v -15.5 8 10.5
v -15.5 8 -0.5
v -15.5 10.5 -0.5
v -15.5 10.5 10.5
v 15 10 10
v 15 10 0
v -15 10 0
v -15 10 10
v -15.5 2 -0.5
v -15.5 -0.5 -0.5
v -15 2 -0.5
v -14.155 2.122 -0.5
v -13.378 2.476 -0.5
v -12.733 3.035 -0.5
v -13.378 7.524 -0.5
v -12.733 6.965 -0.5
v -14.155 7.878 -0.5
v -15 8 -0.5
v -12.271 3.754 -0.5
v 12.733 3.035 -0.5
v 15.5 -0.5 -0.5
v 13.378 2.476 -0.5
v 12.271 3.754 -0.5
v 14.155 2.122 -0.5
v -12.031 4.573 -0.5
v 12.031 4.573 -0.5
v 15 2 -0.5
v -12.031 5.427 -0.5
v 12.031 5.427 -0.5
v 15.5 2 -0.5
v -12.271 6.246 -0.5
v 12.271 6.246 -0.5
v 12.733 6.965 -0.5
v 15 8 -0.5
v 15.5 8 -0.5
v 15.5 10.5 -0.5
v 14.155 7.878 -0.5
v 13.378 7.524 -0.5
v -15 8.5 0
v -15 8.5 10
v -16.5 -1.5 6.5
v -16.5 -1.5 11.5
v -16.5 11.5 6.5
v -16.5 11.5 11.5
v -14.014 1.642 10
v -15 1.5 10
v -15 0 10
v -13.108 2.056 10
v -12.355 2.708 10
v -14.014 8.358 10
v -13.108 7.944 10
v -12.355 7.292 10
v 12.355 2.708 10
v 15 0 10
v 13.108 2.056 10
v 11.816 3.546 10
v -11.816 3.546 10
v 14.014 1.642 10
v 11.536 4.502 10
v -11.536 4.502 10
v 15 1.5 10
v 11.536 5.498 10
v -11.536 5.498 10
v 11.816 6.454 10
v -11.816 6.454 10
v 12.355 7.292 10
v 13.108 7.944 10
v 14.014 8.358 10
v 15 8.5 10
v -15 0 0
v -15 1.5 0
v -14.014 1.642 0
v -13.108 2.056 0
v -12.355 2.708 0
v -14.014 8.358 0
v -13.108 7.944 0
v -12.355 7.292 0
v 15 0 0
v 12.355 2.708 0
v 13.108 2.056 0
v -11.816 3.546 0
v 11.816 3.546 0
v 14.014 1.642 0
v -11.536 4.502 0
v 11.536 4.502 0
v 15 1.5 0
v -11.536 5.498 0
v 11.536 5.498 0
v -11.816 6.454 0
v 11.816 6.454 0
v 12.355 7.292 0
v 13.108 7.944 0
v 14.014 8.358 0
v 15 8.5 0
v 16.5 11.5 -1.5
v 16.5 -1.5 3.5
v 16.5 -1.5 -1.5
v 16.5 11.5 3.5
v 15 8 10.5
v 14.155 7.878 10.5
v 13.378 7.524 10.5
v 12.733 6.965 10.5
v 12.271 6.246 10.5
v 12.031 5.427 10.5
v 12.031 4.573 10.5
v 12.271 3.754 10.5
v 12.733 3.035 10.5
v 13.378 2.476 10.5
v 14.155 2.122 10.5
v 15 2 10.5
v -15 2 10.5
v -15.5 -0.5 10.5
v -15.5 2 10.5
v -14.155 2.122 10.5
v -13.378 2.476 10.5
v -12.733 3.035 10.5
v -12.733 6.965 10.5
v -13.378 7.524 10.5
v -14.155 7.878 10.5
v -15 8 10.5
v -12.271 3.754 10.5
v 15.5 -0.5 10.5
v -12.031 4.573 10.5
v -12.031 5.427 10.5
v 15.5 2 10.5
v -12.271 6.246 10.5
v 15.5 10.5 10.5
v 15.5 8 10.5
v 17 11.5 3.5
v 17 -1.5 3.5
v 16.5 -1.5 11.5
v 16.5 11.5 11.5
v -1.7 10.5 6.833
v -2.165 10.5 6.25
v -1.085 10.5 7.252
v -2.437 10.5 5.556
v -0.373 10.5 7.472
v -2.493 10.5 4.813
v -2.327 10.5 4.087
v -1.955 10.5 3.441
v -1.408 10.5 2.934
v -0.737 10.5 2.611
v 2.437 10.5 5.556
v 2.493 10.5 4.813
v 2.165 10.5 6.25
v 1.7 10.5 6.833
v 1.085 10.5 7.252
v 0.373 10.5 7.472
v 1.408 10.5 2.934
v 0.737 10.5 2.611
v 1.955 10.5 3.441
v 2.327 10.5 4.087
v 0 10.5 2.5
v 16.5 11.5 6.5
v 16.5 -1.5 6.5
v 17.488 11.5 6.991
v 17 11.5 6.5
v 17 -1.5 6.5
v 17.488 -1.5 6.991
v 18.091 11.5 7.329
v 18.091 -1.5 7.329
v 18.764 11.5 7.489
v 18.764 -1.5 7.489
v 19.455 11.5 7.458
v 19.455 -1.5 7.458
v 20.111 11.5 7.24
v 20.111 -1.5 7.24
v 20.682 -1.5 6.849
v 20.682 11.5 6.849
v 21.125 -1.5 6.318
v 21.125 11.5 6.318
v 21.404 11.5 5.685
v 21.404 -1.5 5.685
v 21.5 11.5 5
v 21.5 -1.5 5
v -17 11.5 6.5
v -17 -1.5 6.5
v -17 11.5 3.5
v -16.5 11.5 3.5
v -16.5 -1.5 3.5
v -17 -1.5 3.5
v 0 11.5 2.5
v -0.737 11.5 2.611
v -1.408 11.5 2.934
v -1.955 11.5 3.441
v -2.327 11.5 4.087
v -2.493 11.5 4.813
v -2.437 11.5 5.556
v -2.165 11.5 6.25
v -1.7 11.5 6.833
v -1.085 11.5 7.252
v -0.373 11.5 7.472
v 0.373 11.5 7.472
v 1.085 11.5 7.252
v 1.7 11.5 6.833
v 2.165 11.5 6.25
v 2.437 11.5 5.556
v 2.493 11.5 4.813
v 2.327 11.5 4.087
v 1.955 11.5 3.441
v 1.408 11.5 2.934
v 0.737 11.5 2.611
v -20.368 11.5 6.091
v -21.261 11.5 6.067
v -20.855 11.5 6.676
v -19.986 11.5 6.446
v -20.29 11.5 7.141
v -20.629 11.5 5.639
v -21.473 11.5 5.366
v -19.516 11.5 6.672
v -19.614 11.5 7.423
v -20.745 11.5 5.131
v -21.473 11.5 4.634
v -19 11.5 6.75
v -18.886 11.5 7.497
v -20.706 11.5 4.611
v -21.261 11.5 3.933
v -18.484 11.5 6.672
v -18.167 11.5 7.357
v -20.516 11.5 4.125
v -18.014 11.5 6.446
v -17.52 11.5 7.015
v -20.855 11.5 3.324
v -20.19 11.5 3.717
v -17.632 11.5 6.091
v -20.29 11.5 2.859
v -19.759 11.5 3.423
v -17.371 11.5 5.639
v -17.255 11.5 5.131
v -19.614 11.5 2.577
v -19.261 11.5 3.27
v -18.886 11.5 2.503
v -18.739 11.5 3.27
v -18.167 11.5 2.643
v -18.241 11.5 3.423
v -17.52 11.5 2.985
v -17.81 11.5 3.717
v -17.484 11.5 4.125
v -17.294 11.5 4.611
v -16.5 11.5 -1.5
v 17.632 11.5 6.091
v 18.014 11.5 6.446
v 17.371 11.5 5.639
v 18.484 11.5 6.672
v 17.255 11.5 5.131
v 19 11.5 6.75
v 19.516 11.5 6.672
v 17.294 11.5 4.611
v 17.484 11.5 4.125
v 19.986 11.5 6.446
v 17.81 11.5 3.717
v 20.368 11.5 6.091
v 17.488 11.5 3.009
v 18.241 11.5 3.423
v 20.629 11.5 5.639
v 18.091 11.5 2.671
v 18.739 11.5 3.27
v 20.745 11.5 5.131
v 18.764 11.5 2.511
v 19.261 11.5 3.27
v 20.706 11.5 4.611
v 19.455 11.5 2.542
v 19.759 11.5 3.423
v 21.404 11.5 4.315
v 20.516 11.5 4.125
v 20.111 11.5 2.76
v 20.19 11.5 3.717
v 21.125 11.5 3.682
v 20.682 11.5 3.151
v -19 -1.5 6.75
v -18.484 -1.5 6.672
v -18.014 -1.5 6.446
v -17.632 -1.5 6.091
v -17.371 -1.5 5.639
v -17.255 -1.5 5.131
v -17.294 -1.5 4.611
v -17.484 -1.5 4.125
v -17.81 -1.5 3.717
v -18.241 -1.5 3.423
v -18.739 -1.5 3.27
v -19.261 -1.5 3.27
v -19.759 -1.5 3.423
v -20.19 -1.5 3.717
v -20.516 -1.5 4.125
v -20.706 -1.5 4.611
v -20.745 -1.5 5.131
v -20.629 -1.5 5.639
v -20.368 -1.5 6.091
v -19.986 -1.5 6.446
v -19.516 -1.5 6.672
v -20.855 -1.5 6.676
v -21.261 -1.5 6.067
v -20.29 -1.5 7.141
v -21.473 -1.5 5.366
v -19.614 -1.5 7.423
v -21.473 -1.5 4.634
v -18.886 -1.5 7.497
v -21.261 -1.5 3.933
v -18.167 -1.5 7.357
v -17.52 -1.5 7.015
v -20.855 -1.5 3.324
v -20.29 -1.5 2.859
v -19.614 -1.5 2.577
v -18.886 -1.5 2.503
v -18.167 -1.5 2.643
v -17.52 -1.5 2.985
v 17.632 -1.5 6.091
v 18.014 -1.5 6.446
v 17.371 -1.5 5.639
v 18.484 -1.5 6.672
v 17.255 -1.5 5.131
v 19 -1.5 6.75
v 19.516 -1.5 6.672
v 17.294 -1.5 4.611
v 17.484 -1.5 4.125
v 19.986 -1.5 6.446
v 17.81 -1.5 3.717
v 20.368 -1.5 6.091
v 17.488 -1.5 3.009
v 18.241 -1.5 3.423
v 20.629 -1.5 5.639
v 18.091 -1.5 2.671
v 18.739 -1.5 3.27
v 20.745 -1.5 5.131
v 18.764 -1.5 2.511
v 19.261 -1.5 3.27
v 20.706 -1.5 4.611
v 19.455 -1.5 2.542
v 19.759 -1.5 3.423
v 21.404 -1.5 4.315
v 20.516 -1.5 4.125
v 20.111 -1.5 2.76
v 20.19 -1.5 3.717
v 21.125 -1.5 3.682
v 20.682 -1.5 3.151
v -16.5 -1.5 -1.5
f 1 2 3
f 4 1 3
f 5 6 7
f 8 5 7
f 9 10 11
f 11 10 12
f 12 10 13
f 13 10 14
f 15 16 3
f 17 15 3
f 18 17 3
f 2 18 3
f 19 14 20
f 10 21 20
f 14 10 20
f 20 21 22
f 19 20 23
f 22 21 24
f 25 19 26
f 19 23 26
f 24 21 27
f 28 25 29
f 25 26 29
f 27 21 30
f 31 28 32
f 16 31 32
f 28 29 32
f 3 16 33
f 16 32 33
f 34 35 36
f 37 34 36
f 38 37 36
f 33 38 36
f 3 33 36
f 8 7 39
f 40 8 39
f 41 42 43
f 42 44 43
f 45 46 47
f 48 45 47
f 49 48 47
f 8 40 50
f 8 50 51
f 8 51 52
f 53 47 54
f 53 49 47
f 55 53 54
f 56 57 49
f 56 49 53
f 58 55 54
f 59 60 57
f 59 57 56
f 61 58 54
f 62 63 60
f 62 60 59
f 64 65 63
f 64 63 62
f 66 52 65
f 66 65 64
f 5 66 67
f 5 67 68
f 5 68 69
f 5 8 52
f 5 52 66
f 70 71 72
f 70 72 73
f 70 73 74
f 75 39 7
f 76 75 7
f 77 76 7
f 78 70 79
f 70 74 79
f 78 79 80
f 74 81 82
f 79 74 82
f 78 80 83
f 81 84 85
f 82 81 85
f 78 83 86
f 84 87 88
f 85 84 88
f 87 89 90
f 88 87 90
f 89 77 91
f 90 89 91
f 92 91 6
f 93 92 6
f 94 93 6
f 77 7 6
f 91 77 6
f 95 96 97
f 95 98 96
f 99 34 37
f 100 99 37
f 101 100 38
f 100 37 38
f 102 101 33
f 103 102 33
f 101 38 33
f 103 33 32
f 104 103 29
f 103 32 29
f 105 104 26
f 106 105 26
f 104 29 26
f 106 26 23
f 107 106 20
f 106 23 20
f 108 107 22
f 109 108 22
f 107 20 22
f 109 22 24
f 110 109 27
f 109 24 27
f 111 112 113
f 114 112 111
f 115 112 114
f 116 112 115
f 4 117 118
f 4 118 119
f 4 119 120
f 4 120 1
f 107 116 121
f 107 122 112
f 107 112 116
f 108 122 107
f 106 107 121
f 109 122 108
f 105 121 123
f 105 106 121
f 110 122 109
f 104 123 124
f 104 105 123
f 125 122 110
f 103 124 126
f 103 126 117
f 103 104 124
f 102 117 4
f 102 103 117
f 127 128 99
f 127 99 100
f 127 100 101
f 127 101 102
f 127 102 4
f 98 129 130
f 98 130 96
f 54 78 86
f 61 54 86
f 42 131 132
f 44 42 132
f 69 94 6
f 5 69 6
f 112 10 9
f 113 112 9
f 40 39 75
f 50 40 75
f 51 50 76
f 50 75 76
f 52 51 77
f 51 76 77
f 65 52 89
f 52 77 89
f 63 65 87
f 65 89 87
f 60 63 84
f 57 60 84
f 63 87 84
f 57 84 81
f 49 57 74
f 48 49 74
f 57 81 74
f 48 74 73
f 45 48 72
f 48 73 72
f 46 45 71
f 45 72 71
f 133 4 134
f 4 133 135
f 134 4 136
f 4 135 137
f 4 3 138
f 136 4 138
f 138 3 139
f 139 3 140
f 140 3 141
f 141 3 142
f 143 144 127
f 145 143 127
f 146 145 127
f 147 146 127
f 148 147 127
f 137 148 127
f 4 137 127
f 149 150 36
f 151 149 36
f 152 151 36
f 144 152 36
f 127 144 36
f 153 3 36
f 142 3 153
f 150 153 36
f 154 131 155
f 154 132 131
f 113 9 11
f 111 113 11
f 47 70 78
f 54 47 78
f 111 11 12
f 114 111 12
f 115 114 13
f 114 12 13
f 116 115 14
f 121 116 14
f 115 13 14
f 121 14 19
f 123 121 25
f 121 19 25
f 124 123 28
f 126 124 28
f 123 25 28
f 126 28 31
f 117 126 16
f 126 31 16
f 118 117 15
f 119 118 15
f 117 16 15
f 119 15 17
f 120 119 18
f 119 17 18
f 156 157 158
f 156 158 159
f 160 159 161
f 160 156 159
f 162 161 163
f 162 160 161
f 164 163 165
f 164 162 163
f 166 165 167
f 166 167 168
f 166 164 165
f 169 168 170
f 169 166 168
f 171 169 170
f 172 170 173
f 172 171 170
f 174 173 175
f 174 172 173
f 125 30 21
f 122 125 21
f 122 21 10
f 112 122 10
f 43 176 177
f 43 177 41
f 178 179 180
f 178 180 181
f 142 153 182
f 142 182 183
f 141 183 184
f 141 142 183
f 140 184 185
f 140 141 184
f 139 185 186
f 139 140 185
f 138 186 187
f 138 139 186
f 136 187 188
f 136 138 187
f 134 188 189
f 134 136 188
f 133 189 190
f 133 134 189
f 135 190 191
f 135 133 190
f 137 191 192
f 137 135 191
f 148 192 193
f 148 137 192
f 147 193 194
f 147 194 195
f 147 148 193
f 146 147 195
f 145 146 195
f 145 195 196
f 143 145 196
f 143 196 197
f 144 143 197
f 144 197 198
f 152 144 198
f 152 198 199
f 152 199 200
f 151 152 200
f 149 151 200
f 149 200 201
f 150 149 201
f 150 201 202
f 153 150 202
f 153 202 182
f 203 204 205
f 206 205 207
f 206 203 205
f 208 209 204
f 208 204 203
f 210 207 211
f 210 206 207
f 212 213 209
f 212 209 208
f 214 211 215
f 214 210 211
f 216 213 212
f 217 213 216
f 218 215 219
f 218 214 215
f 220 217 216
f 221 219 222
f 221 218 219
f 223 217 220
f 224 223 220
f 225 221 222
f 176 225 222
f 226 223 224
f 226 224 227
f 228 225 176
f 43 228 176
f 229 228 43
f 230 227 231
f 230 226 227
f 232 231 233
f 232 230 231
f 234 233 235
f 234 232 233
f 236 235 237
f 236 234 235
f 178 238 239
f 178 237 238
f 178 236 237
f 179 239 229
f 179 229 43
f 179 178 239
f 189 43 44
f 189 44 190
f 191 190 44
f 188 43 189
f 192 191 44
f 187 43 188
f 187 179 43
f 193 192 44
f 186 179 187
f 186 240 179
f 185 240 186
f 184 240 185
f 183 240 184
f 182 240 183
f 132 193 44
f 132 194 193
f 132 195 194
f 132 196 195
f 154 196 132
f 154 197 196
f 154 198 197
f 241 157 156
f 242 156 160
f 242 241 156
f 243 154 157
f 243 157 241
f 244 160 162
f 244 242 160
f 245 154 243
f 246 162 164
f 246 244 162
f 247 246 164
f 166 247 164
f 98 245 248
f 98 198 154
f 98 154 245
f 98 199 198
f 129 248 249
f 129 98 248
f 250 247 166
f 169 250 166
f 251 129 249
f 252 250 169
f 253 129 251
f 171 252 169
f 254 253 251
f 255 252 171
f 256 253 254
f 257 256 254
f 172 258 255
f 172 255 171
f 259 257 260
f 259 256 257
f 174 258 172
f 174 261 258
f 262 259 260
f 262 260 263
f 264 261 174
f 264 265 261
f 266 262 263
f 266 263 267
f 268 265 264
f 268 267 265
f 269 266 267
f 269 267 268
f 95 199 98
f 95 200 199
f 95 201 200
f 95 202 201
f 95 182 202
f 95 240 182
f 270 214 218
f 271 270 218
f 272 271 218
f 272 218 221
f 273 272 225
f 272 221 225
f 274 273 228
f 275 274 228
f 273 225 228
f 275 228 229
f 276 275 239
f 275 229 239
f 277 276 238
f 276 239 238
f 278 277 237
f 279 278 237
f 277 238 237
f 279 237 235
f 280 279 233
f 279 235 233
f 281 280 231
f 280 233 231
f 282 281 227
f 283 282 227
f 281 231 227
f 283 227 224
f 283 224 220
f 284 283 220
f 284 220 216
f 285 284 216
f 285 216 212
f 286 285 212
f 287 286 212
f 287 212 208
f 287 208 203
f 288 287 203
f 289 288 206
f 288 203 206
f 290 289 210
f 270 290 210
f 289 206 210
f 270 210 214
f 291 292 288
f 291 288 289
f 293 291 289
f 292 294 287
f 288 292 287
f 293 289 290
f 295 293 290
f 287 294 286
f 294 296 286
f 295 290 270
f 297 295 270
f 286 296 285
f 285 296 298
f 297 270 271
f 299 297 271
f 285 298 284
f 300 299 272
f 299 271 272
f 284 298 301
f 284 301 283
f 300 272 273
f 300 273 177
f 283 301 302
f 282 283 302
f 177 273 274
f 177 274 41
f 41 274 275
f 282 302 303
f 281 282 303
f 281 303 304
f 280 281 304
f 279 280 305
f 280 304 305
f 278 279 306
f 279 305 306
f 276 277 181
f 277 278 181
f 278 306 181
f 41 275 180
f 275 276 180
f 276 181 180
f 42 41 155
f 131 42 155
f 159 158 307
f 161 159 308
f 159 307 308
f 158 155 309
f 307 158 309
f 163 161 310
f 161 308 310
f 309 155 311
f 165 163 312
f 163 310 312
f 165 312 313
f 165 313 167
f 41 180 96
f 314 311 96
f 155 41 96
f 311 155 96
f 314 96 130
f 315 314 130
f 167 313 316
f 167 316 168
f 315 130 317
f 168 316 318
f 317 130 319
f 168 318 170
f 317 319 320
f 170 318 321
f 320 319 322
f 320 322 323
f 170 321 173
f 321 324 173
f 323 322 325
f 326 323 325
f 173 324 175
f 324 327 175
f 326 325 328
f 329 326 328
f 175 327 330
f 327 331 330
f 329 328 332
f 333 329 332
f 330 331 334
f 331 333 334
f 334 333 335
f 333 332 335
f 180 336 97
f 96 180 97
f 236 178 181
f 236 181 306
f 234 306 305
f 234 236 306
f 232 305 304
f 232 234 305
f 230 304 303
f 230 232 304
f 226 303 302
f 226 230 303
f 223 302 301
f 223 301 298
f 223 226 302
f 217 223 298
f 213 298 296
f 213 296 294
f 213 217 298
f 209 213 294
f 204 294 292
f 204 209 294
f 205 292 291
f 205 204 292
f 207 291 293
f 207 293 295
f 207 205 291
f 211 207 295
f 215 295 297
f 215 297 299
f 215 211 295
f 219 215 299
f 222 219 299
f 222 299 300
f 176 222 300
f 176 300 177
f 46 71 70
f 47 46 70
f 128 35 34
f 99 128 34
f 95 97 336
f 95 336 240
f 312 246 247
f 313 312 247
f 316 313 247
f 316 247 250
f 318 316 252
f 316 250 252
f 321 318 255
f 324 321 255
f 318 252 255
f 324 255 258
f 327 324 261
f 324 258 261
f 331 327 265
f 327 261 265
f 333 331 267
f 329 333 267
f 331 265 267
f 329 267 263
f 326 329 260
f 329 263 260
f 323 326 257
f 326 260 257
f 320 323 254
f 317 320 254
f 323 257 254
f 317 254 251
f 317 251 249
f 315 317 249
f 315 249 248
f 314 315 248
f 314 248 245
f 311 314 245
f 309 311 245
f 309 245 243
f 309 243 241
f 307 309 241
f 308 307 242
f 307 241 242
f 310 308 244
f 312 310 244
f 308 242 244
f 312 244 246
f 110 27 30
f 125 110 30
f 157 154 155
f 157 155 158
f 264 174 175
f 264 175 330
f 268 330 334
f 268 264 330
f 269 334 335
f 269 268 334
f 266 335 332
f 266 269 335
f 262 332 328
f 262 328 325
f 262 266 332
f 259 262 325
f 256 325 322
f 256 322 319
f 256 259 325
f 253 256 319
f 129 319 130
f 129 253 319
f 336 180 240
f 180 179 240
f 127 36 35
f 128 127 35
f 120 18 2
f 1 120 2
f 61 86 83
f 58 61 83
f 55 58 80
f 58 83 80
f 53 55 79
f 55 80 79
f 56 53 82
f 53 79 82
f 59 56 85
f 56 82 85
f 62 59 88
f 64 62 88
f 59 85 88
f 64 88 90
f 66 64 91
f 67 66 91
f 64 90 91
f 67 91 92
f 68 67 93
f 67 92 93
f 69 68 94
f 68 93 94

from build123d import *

# Parameters (mm, degrees)
BOSS_EXTRUDE2_DEPTH = 10
BOSS_EXTRUDE3_DEPTH = 11
SKETCH3_W           = 1
SKETCH3_H           = 13
BOSS_EXTRUDE4_DEPTH = 33
SKETCH4_R           = 1.75
BOSS_EXTRUDE5_DEPTH = 13
SKETCH5_R           = 2.5
CUT_EXTRUDE1_DEPTH  = 1.5


with BuildPart() as part:
    # Sketch1 → Boss-Extrude2 (new body)
    with BuildSketch(Plane.XY):
        with BuildLine():
            Line((-15, 0), (15, 0))
            Line((15, 0), (15, 1.5))
            ThreePointArc((15, 1.5), (11.5, 5), (15, 8.5))
            Line((15, 8.5), (15, 10))
            Line((15, 10), (-15, 10))
            Line((-15, 10), (-15, 8.5))
            ThreePointArc((-15, 8.5), (-11.5, 5), (-15, 1.5))
            Line((-15, 1.5), (-15, 0))
        make_face()
    extrude(amount=BOSS_EXTRUDE2_DEPTH)


with BuildPart() as body_2:
    # Sketch2 → Boss-Extrude3 (new body)
    # profile 1 of 3: a face of its own
    with BuildSketch(Plane(origin=(0, 0, -0.5), x_dir=(-1, 0, 0), z_dir=(0, 0, -1))):
        with BuildLine():
            Line((15, 3), (16.5, 3))
            Line((16.5, 3), (16.5, -1.5))
            Line((16.5, -1.5), (0, -1.5))
            Line((0, -1.5), (-16.5, -1.5))
            Line((-16.5, -1.5), (-16.5, 3))
            Line((-16.5, 3), (-15, 3))
            ThreePointArc((-15, 3), (-13, 5), (-15, 7))
            Line((-15, 7), (-16.5, 7))
            Line((-16.5, 7), (-16.5, 11.5))
            Line((-16.5, 11.5), (0, 11.5))
            Line((0, 11.5), (16.5, 11.5))
            Line((16.5, 11.5), (16.5, 7))
            Line((16.5, 7), (15, 7))
            ThreePointArc((15, 7), (13, 5), (15, 3))
        make_face()
        with BuildLine():
            ThreePointArc((15, 2), (12, 5), (15, 8))
            Line((15, 8), (15.5, 8))
            Line((15.5, 8), (15.5, 10.5))
            Line((15.5, 10.5), (0, 10.5))
            Line((0, 10.5), (-15.5, 10.5))
            Line((-15.5, 10.5), (-15.5, 8))
            Line((-15.5, 8), (-15, 8))
            ThreePointArc((-15, 8), (-12, 5), (-15, 2))
            Line((-15, 2), (-15.5, 2))
            Line((-15.5, 2), (-15.5, -0.5))
            Line((-15.5, -0.5), (0, -0.5))
            Line((0, -0.5), (15.5, -0.5))
            Line((15.5, -0.5), (15.5, 2))
            Line((15.5, 2), (15, 2))
        make_face(mode=Mode.SUBTRACT)
    # profile 2 of 3: a face of its own
    with BuildSketch(Plane(origin=(0, 0, -0.5), x_dir=(-1, 0, 0), z_dir=(0, 0, -1))):
        with BuildLine():
            ThreePointArc((15, 3), (13, 5), (15, 7))
            Line((15, 7), (16.5, 7))
            Line((16.5, 7), (16.5, 3))
            Line((16.5, 3), (15, 3))
        make_face()
    # profile 3 of 3: a face of its own
    with BuildSketch(Plane(origin=(0, 0, -0.5), x_dir=(-1, 0, 0), z_dir=(0, 0, -1))):
        with BuildLine():
            Line((-15, 3), (-16.5, 3))
            Line((-16.5, 3), (-16.5, 7))
            Line((-16.5, 7), (-15, 7))
            ThreePointArc((-15, 7), (-13, 5), (-15, 3))
        make_face()
    extrude(amount=-BOSS_EXTRUDE3_DEPTH)

    # Sketch3 → Boss-Extrude4 (add)
    with BuildSketch(Plane(origin=(16.5, 0, 0), x_dir=(0, 0, -1), z_dir=(1, 0, 0))):
        with Locations((1, 5)):
            Rectangle(SKETCH3_W, SKETCH3_H)
        with Locations((-11, 5)):
            Rectangle(SKETCH3_W, SKETCH3_H)
    extrude(amount=-BOSS_EXTRUDE4_DEPTH)

    # Sketch4 → Boss-Extrude5 (add)
    # profile 1 of 8: a face of its own
    with BuildSketch(Plane(origin=(0, 11.5, 0), x_dir=(1, 0, 0), z_dir=(0, 1, 0))):
        with BuildLine():
            Line((-17.1, -3.5), (-17, -3.5))
            ThreePointArc((-17, -3.5), (-21.5, -5), (-17, -6.5))
            Line((-17, -6.5), (-17.1, -6.5))
            Line((-17.1, -6.5), (-17.1, -3.5))
        make_face()
        with Locations(Location((-19, -5, 0), (0, 0, 270))):
            Circle(SKETCH4_R, mode=Mode.SUBTRACT)
    # profile 2 of 8: a face of its own
    with BuildSketch(Plane(origin=(0, 11.5, 0), x_dir=(1, 0, 0), z_dir=(0, 1, 0))):
        with BuildLine():
            ThreePointArc((-16.5, -5), (-16.628291755, -4.209430585), (-17, -3.5))
            Line((-17, -3.5), (-17.1, -3.5))
            Line((-17.1, -3.5), (-17.1, -6.5))
            Line((-17.1, -6.5), (-17, -6.5))
            ThreePointArc((-17, -6.5), (-16.628291755, -5.790569415), (-16.5, -5))
        make_face()
    # profile 3 of 8: a face of its own
    with BuildSketch(Plane(origin=(0, 11.5, 0), x_dir=(1, 0, 0), z_dir=(0, 1, 0))):
        with BuildLine():
            Line((-16.5, -6.5), (-16.5, -5))
            ThreePointArc((-16.5, -5), (-16.628291755, -5.790569415), (-17, -6.5))
            Line((-17, -6.5), (-16.5, -6.5))
        make_face()
    # profile 4 of 8: a face of its own
    with BuildSketch(Plane(origin=(0, 11.5, 0), x_dir=(1, 0, 0), z_dir=(0, 1, 0))):
        with BuildLine():
            Line((-16.5, -5), (-16.5, -3.5))
            Line((-16.5, -3.5), (-17, -3.5))
            ThreePointArc((-17, -3.5), (-16.628291755, -4.209430585), (-16.5, -5))
        make_face()
    # profile 5 of 8: a face of its own
    with BuildSketch(Plane(origin=(0, 11.5, 0), x_dir=(1, 0, 0), z_dir=(0, 1, 0))):
        with BuildLine():
            ThreePointArc((16.5, -5), (16.628291755, -5.790569415), (17, -6.5))
            Line((17, -6.5), (17.1, -6.5))
            Line((17.1, -6.5), (17.1, -3.5))
            Line((17.1, -3.5), (17, -3.5))
            ThreePointArc((17, -3.5), (16.628291755, -4.209430585), (16.5, -5))
        make_face()
    # profile 6 of 8: a face of its own
    with BuildSketch(Plane(origin=(0, 11.5, 0), x_dir=(1, 0, 0), z_dir=(0, 1, 0))):
        with BuildLine():
            Line((16.5, -3.5), (16.5, -5))
            ThreePointArc((16.5, -5), (16.628291755, -4.209430585), (17, -3.5))
            Line((17, -3.5), (16.5, -3.5))
        make_face()
    # profile 7 of 8: a face of its own
    with BuildSketch(Plane(origin=(0, 11.5, 0), x_dir=(1, 0, 0), z_dir=(0, 1, 0))):
        with BuildLine():
            Line((16.5, -5), (16.5, -6.5))
            Line((16.5, -6.5), (17, -6.5))
            ThreePointArc((17, -6.5), (16.628291755, -5.790569415), (16.5, -5))
        make_face()
    # profile 8 of 8: a face of its own
    with BuildSketch(Plane(origin=(0, 11.5, 0), x_dir=(1, 0, 0), z_dir=(0, 1, 0))):
        with BuildLine():
            Line((17.1, -6.5), (17, -6.5))
            ThreePointArc((17, -6.5), (19.790569415, -7.371708245), (21.5, -5))
            ThreePointArc((21.5, -5), (19.790569415, -2.628291755), (17, -3.5))
            Line((17, -3.5), (17.1, -3.5))
            Line((17.1, -3.5), (17.1, -6.5))
        make_face()
        with Locations(Location((19, -5, 0), (0, 0, 270))):
            Circle(SKETCH4_R, mode=Mode.SUBTRACT)
    extrude(amount=-BOSS_EXTRUDE5_DEPTH)

    # Sketch5 → Cut-Extrude1 (cut)
    with BuildSketch(Plane(origin=(0, 10, 0), x_dir=(1, 0, 0), z_dir=(0, 1, 0))):
        with Locations(Location((0, -5, 0), (0, 0, 90))):
            Circle(SKETCH5_R)
    extrude(amount=CUT_EXTRUDE1_DEPTH, mode=Mode.SUBTRACT)


solid = Compound([part.part, body_2.part])
